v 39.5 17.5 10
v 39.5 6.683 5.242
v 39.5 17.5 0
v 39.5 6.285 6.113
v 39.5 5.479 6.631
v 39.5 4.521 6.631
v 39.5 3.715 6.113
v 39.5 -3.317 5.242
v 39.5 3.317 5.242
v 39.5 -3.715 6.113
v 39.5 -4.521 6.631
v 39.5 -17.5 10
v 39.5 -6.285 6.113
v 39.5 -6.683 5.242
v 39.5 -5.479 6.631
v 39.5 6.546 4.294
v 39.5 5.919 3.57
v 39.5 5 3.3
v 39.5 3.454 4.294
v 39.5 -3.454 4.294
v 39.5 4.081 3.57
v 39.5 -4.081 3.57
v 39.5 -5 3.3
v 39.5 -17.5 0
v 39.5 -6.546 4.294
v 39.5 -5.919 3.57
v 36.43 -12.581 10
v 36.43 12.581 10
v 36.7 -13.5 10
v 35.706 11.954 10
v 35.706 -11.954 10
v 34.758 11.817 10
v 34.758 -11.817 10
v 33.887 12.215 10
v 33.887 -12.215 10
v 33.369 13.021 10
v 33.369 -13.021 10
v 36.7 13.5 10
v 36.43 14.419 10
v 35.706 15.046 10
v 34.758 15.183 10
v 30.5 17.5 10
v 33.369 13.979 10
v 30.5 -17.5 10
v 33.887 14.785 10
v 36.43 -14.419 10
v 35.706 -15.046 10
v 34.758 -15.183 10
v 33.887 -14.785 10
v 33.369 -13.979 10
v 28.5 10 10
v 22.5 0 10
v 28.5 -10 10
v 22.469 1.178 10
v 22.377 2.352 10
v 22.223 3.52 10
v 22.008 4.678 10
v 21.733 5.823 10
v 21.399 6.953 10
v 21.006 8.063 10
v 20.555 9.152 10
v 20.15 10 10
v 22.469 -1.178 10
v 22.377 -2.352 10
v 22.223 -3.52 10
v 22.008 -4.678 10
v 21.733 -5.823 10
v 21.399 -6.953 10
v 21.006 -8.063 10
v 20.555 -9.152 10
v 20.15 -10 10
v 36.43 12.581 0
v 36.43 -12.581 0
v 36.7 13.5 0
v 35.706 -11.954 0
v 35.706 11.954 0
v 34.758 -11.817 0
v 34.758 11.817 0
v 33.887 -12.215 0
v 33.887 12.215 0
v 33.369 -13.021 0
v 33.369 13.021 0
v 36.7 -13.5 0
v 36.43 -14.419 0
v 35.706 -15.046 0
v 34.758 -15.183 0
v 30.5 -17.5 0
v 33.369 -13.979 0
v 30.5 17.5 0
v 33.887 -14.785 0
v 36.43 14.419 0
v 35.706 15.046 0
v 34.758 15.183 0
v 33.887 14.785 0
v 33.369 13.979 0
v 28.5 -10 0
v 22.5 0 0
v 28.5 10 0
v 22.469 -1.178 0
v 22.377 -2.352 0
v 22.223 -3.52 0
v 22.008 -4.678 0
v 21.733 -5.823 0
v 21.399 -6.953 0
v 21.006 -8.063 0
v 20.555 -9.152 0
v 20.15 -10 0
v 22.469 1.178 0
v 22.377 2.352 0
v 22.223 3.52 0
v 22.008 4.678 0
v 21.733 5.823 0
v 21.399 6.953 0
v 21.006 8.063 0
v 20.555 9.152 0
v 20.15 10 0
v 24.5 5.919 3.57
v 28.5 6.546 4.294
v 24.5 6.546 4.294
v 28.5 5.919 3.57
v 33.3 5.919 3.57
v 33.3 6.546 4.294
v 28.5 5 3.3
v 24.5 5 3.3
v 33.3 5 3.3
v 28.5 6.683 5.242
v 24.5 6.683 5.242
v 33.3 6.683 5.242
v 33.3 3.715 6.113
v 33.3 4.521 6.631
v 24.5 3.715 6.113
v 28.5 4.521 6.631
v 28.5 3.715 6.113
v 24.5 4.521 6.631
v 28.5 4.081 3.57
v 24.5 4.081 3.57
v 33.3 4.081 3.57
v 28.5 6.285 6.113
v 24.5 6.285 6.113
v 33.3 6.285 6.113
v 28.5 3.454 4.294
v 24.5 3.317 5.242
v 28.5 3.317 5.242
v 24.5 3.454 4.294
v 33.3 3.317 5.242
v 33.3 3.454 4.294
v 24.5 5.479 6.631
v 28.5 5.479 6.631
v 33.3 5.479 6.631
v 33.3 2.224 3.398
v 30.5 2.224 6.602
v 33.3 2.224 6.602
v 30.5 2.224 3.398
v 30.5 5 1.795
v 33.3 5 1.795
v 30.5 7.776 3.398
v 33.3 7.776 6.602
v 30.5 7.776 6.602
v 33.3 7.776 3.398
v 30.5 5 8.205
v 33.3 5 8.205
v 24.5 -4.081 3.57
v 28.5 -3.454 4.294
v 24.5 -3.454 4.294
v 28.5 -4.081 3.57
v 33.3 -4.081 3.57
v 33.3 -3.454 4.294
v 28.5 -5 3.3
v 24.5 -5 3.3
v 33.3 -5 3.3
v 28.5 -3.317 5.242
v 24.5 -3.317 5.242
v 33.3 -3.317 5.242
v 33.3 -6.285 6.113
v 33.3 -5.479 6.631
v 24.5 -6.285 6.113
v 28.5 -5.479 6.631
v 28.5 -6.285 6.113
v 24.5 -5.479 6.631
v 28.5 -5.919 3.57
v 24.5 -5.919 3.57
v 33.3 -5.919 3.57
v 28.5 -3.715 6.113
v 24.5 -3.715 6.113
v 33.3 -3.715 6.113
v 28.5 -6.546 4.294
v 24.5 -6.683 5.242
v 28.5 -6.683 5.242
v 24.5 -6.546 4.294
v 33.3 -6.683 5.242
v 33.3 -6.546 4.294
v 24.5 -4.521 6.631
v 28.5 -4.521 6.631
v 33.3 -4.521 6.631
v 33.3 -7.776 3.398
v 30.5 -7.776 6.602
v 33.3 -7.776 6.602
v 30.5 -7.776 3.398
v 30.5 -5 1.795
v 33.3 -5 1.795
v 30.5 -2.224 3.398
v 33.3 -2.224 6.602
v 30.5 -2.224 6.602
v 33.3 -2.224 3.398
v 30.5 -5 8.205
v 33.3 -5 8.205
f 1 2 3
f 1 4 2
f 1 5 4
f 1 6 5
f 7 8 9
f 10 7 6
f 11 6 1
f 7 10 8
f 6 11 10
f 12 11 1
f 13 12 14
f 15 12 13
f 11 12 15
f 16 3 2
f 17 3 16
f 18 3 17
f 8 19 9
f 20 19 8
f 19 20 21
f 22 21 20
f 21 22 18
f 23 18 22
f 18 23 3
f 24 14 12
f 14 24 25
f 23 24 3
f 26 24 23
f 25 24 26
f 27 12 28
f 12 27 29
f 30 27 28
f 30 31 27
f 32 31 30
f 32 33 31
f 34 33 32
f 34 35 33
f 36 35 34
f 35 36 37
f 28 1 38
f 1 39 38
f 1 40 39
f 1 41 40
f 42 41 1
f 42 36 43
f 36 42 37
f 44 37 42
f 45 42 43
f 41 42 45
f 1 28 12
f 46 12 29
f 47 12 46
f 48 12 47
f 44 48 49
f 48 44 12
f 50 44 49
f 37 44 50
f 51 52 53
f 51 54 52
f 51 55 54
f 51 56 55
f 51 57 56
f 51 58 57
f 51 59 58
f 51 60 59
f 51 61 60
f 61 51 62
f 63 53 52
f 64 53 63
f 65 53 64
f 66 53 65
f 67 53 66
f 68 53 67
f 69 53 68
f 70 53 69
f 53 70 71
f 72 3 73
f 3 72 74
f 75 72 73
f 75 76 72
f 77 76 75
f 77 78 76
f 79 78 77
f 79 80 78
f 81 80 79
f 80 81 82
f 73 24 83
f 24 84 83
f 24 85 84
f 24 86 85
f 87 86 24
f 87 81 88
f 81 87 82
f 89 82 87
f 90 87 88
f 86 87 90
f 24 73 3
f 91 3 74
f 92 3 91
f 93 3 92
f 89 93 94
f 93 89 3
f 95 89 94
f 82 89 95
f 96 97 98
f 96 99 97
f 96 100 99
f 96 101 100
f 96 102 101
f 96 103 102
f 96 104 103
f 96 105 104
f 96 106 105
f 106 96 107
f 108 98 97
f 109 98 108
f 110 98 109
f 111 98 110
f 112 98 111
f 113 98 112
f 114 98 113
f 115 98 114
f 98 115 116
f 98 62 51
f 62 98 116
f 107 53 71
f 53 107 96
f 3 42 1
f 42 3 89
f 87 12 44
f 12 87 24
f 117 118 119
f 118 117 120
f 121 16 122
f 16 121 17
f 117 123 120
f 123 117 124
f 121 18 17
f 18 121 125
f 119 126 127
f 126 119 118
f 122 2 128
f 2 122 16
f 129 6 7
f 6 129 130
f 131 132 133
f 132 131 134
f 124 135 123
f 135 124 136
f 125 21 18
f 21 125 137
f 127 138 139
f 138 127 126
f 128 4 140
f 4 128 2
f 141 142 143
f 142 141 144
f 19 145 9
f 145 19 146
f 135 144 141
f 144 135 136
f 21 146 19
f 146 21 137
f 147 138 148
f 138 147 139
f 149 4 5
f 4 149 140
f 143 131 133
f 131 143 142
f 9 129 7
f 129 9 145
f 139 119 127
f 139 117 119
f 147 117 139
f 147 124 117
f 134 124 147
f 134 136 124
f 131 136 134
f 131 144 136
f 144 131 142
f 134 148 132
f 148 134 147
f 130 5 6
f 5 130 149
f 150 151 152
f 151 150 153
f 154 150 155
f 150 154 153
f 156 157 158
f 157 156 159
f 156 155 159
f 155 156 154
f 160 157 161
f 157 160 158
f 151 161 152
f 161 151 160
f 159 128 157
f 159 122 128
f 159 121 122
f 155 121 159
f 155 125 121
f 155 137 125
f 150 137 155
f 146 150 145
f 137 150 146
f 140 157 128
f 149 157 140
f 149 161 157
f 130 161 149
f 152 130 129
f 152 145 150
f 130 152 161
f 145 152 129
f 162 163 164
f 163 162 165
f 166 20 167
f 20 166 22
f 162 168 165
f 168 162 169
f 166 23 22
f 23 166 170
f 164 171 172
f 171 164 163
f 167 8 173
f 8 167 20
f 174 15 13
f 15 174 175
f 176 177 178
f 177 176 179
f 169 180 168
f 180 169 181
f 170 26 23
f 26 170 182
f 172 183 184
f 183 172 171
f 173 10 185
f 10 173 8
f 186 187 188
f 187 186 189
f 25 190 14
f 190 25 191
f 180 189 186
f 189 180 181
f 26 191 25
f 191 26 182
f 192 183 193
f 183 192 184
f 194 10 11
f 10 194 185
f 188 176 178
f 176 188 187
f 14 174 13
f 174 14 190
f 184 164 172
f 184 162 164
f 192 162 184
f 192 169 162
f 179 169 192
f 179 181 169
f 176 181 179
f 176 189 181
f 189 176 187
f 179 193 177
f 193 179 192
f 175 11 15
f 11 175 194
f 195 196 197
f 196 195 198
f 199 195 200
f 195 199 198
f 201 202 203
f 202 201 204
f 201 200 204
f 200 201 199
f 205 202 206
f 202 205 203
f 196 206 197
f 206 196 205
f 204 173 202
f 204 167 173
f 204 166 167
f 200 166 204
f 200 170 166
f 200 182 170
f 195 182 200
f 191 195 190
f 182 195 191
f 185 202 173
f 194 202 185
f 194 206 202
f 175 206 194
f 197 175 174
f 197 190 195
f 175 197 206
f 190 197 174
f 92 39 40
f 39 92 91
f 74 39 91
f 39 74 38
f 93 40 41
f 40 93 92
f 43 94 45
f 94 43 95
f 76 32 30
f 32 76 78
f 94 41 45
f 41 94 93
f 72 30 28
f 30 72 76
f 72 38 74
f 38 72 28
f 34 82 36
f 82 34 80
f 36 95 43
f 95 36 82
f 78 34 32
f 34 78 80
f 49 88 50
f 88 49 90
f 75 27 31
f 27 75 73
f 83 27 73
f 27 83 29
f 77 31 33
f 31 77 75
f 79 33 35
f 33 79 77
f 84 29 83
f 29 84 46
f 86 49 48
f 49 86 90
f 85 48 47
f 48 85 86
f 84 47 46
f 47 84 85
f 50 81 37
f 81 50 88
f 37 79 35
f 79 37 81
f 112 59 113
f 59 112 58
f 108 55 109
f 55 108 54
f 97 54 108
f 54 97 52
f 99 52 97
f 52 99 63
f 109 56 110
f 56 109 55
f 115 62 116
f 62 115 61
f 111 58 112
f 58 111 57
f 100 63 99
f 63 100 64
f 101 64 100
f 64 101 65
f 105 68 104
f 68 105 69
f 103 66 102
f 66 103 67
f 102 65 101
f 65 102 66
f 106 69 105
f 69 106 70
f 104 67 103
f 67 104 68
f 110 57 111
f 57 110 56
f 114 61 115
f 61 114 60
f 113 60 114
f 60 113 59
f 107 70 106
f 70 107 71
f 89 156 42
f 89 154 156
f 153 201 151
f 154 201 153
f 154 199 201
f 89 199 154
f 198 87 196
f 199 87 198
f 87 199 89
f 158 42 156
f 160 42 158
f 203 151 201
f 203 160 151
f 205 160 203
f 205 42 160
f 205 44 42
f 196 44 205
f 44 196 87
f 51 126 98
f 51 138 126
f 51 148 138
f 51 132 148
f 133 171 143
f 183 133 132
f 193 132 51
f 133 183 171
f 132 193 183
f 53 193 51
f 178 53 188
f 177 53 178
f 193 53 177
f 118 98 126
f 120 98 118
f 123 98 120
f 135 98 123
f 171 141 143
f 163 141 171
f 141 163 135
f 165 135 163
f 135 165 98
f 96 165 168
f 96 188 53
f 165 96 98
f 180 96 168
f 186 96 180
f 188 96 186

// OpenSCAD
// file: config.scad
//General Settings
play=0.2; //to make fittings (add to some holes if nessesary)
//circle resolution 
$fa = 3;
$fs = 1;//0.5;

aluminum = [0.9, 0.9, 0.9];
steel = [0.8, 0.8, 0.9];
wood="BurlyWood";

//ISO/DIN Parts 
//Kugellager
kugellager_d=5+play;
kugellager_h=2.5+play;

//Mutter M2
M2_nut_d=4.38+2*play;
M2_nut_w=4+2*play;
M2_nut_h=1.6+2*play;

//Mutter M3
M3_nut_d=6.01+2*play;
M3_nut_w=5.5+2*play;
M3_nut_h=2.4+2*play;

//Mutter M4
M4_nut_d=7.66+2*play;
M4_nut_w=7+2*play;
M4_nut_h=3.2+2*play;

//Mutter M5
M5_nut_d=9.23+2*play;
M5_nut_w=8+2*play;
M5_nut_h=4+2*play;


//Mutter M8
M8_nut_d=14.38+2*play;
M8_nut_w=13+2*play;
M8_nut_h=6.8+2*play;

//LMXXUU Linear Ball Bearing
LMXXUU_d=19;
LMXXUU_l=29;

//Pully 2.5
band_w=5;
band_b=2;
band_outer_d=13;
//Ballbearing opposit for pully
band_bb_id=5;
band_bb_od=11;
band_bb_w=4;

//Bearing
B608Z_od=22+2*play;
B608Z_id=8+2*play;
B608Z_isd=13;
B608Z_h=7;

//Nema17
nema17_od=42.3;
nema17_id=22+2*play;
nema17_screw_d=31;
nema17_l=48;

//Nema17
nema23_id=38.1+2*play;
nema23_screw_d=47.14;
// main file
include <config.scad>

module motor(){
    w=20;
    translate([45/2-3,0,0])
    difference(){
       union(){
            translate([0,-w/2,0])
                cube([20,w,10]);
            
            translate([10,-(w+15)/2,0])
                cube([10,w+15,10]);
        }
        translate([-45/2+3,0,-1])
            cylinder(h=10+2,d=45);
        
        translate([9,-(w+15+2)/2,-1])
            cube([2,w+15+2,10+2]);
        
        for(d=[1,-1])
        translate([5,d*(w/2-5),10/2])
        rotate([0,90,0]){
            cylinder(h=20+2,d=3+play*2);
            translate([0,0,3+3-1])
                cylinder(h=M3_nut_h+1,r=M3_nut_d/2,$fn=6);        
        }
        
        for(d=[1,-1])
        translate([18.5-3,d*(w+12-5)/2,-1])
            cylinder(h=10+2,d=3+play*2);
    }
}

motor();
